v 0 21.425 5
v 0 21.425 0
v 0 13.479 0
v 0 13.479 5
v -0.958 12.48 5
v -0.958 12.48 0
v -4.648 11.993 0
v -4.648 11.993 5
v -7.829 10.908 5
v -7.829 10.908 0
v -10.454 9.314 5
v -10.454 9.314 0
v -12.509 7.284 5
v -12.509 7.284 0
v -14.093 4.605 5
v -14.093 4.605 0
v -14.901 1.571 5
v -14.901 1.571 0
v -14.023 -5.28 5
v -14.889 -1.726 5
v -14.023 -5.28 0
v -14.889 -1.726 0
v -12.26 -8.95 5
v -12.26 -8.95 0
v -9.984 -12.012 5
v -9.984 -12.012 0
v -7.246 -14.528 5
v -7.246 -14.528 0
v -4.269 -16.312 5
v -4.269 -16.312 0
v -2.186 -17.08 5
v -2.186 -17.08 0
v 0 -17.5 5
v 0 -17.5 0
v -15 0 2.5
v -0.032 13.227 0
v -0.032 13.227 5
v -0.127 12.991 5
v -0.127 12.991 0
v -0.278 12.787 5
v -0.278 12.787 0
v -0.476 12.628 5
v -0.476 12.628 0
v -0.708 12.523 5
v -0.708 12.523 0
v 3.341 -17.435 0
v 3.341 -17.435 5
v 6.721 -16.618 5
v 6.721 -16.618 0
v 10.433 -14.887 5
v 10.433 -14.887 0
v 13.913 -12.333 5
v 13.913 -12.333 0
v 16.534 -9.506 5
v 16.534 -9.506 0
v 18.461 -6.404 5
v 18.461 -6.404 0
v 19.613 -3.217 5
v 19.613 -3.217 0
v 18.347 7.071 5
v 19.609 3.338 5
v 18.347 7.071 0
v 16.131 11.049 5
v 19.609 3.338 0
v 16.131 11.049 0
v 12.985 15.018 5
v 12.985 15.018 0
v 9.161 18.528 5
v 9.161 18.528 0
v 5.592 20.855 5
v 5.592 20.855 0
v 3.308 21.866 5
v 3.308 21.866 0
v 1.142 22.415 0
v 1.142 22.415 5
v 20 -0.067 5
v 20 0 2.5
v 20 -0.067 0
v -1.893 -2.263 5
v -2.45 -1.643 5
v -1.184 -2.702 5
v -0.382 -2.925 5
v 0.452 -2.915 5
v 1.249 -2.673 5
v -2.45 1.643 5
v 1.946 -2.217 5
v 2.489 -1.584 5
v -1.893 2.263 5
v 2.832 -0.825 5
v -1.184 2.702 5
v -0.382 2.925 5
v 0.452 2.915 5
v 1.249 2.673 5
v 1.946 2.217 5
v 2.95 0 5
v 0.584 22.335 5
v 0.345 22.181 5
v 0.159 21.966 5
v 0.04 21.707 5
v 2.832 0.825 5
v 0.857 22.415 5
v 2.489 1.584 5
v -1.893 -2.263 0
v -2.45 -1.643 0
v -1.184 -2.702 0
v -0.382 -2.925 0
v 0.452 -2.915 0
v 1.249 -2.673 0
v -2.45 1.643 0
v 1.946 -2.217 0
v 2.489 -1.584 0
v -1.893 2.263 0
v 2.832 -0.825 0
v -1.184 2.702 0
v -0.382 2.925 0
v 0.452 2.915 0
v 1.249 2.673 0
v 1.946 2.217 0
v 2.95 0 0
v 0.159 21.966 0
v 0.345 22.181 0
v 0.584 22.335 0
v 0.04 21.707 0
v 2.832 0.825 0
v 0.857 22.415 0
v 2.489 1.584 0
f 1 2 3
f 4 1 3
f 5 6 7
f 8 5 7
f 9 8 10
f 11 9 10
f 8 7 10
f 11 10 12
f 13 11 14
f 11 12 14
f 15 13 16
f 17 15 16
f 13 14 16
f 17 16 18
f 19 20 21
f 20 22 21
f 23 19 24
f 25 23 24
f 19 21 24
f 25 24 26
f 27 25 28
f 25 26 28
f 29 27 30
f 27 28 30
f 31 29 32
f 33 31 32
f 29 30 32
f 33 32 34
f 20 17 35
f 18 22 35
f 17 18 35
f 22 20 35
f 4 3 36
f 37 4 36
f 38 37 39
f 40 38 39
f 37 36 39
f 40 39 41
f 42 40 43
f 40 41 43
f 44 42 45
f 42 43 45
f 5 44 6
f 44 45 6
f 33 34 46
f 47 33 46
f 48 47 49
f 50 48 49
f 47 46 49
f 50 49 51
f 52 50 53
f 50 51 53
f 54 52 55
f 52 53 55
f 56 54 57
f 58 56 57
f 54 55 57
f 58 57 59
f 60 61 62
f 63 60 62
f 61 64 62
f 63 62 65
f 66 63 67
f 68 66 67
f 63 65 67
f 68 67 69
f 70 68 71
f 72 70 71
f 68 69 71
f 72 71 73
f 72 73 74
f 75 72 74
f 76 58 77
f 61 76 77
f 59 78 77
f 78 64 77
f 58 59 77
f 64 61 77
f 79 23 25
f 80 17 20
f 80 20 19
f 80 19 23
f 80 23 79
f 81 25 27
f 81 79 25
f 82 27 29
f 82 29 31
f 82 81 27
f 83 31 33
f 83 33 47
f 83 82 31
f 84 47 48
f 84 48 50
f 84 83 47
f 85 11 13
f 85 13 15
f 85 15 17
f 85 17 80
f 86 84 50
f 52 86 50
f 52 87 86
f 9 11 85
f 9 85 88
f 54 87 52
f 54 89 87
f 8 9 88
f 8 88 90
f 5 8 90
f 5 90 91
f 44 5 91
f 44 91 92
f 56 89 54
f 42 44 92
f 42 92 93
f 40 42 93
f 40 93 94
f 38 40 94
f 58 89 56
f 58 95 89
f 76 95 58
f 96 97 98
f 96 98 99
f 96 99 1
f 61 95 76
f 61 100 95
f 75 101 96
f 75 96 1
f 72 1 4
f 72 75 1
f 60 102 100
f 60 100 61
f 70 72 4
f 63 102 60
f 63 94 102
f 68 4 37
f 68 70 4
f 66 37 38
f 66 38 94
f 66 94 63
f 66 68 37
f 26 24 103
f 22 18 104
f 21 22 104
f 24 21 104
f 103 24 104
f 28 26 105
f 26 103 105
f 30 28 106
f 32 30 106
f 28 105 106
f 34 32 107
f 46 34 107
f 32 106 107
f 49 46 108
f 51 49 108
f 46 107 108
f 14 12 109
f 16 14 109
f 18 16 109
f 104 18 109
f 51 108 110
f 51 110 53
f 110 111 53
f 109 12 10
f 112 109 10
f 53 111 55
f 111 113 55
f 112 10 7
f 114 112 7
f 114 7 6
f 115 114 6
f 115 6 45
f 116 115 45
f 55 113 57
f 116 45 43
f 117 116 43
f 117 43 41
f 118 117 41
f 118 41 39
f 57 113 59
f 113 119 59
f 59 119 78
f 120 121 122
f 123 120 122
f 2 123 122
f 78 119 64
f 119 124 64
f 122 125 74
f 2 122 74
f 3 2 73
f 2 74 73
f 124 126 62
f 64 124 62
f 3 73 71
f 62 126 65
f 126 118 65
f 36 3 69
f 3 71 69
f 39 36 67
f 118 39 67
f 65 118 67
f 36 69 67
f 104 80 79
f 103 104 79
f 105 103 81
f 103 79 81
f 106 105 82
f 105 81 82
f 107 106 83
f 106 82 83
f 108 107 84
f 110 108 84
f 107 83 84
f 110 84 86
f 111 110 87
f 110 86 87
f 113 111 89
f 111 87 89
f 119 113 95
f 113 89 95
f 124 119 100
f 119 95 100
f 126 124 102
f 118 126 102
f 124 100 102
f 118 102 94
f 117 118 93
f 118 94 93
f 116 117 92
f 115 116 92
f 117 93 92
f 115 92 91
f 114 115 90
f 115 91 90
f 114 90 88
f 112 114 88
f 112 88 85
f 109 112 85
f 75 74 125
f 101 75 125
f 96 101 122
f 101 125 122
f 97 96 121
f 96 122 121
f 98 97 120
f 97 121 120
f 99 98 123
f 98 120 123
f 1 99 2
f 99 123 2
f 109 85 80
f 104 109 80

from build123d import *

# Parameters (mm, degrees)
F1_DEPTH = 5
F3_DEPTH = 5


with BuildPart() as f1:
    # F0 (on Top) → F1 (new body)
    with BuildSketch(Plane.XY):
        with BuildLine():
            ThreePointArc((1.1420704693, 22.4149806807), (0.3450459823, 22.180792868), (0, 21.4251241346))
            Line((0, 21.4251241346), (0, 13.4793751215))
            ThreePointArc((0, 13.4793751215), (-0.2783323598, 12.7871354108), (-0.9583916341, 12.4802411245))
            add(Edge.make_bspline(
                [(-0.9583916341, 12.4802411245), (-9.7677869501, 12.1133788767), (-20.8879182433, 0.572881244), (-8.3742030553, -16.6290905544), (0, -17.5)],
                knots=[0.0076786773, 0.0076786773, 0.0076786773, 0.0076786773, 0.2224792249, 0.4641987518, 0.4641987518, 0.4641987518, 0.4641987518], degree=3))
            add(Edge.make_bspline(
                [(0, -17.5), (8.9920428291, -18.4351642161), (31.1411413145, -1.2068050011), (8.7240631606, 21.3267651565), (1.1420704693, 22.4149806807)],
                knots=[0.4641987518, 0.4641987518, 0.4641987518, 0.4641987518, 0.7237520877, 0.9864457327, 0.9864457327, 0.9864457327, 0.9864457327], degree=3))
        make_face()
    extrude(amount=F1_DEPTH)

    # F2 (on face) → F3 (cut)
    with BuildSketch(Plane.XY.offset(5)):
        with BuildLine():
            ThreePointArc((-2.45, -1.6431676725), (2.95, 0), (-2.45, 1.6431676725))
            Line((-2.45, 1.6431676725), (-2.45, -1.6431676725))
        make_face()
    extrude(amount=-F3_DEPTH, mode=Mode.SUBTRACT)


solid = f1.part
